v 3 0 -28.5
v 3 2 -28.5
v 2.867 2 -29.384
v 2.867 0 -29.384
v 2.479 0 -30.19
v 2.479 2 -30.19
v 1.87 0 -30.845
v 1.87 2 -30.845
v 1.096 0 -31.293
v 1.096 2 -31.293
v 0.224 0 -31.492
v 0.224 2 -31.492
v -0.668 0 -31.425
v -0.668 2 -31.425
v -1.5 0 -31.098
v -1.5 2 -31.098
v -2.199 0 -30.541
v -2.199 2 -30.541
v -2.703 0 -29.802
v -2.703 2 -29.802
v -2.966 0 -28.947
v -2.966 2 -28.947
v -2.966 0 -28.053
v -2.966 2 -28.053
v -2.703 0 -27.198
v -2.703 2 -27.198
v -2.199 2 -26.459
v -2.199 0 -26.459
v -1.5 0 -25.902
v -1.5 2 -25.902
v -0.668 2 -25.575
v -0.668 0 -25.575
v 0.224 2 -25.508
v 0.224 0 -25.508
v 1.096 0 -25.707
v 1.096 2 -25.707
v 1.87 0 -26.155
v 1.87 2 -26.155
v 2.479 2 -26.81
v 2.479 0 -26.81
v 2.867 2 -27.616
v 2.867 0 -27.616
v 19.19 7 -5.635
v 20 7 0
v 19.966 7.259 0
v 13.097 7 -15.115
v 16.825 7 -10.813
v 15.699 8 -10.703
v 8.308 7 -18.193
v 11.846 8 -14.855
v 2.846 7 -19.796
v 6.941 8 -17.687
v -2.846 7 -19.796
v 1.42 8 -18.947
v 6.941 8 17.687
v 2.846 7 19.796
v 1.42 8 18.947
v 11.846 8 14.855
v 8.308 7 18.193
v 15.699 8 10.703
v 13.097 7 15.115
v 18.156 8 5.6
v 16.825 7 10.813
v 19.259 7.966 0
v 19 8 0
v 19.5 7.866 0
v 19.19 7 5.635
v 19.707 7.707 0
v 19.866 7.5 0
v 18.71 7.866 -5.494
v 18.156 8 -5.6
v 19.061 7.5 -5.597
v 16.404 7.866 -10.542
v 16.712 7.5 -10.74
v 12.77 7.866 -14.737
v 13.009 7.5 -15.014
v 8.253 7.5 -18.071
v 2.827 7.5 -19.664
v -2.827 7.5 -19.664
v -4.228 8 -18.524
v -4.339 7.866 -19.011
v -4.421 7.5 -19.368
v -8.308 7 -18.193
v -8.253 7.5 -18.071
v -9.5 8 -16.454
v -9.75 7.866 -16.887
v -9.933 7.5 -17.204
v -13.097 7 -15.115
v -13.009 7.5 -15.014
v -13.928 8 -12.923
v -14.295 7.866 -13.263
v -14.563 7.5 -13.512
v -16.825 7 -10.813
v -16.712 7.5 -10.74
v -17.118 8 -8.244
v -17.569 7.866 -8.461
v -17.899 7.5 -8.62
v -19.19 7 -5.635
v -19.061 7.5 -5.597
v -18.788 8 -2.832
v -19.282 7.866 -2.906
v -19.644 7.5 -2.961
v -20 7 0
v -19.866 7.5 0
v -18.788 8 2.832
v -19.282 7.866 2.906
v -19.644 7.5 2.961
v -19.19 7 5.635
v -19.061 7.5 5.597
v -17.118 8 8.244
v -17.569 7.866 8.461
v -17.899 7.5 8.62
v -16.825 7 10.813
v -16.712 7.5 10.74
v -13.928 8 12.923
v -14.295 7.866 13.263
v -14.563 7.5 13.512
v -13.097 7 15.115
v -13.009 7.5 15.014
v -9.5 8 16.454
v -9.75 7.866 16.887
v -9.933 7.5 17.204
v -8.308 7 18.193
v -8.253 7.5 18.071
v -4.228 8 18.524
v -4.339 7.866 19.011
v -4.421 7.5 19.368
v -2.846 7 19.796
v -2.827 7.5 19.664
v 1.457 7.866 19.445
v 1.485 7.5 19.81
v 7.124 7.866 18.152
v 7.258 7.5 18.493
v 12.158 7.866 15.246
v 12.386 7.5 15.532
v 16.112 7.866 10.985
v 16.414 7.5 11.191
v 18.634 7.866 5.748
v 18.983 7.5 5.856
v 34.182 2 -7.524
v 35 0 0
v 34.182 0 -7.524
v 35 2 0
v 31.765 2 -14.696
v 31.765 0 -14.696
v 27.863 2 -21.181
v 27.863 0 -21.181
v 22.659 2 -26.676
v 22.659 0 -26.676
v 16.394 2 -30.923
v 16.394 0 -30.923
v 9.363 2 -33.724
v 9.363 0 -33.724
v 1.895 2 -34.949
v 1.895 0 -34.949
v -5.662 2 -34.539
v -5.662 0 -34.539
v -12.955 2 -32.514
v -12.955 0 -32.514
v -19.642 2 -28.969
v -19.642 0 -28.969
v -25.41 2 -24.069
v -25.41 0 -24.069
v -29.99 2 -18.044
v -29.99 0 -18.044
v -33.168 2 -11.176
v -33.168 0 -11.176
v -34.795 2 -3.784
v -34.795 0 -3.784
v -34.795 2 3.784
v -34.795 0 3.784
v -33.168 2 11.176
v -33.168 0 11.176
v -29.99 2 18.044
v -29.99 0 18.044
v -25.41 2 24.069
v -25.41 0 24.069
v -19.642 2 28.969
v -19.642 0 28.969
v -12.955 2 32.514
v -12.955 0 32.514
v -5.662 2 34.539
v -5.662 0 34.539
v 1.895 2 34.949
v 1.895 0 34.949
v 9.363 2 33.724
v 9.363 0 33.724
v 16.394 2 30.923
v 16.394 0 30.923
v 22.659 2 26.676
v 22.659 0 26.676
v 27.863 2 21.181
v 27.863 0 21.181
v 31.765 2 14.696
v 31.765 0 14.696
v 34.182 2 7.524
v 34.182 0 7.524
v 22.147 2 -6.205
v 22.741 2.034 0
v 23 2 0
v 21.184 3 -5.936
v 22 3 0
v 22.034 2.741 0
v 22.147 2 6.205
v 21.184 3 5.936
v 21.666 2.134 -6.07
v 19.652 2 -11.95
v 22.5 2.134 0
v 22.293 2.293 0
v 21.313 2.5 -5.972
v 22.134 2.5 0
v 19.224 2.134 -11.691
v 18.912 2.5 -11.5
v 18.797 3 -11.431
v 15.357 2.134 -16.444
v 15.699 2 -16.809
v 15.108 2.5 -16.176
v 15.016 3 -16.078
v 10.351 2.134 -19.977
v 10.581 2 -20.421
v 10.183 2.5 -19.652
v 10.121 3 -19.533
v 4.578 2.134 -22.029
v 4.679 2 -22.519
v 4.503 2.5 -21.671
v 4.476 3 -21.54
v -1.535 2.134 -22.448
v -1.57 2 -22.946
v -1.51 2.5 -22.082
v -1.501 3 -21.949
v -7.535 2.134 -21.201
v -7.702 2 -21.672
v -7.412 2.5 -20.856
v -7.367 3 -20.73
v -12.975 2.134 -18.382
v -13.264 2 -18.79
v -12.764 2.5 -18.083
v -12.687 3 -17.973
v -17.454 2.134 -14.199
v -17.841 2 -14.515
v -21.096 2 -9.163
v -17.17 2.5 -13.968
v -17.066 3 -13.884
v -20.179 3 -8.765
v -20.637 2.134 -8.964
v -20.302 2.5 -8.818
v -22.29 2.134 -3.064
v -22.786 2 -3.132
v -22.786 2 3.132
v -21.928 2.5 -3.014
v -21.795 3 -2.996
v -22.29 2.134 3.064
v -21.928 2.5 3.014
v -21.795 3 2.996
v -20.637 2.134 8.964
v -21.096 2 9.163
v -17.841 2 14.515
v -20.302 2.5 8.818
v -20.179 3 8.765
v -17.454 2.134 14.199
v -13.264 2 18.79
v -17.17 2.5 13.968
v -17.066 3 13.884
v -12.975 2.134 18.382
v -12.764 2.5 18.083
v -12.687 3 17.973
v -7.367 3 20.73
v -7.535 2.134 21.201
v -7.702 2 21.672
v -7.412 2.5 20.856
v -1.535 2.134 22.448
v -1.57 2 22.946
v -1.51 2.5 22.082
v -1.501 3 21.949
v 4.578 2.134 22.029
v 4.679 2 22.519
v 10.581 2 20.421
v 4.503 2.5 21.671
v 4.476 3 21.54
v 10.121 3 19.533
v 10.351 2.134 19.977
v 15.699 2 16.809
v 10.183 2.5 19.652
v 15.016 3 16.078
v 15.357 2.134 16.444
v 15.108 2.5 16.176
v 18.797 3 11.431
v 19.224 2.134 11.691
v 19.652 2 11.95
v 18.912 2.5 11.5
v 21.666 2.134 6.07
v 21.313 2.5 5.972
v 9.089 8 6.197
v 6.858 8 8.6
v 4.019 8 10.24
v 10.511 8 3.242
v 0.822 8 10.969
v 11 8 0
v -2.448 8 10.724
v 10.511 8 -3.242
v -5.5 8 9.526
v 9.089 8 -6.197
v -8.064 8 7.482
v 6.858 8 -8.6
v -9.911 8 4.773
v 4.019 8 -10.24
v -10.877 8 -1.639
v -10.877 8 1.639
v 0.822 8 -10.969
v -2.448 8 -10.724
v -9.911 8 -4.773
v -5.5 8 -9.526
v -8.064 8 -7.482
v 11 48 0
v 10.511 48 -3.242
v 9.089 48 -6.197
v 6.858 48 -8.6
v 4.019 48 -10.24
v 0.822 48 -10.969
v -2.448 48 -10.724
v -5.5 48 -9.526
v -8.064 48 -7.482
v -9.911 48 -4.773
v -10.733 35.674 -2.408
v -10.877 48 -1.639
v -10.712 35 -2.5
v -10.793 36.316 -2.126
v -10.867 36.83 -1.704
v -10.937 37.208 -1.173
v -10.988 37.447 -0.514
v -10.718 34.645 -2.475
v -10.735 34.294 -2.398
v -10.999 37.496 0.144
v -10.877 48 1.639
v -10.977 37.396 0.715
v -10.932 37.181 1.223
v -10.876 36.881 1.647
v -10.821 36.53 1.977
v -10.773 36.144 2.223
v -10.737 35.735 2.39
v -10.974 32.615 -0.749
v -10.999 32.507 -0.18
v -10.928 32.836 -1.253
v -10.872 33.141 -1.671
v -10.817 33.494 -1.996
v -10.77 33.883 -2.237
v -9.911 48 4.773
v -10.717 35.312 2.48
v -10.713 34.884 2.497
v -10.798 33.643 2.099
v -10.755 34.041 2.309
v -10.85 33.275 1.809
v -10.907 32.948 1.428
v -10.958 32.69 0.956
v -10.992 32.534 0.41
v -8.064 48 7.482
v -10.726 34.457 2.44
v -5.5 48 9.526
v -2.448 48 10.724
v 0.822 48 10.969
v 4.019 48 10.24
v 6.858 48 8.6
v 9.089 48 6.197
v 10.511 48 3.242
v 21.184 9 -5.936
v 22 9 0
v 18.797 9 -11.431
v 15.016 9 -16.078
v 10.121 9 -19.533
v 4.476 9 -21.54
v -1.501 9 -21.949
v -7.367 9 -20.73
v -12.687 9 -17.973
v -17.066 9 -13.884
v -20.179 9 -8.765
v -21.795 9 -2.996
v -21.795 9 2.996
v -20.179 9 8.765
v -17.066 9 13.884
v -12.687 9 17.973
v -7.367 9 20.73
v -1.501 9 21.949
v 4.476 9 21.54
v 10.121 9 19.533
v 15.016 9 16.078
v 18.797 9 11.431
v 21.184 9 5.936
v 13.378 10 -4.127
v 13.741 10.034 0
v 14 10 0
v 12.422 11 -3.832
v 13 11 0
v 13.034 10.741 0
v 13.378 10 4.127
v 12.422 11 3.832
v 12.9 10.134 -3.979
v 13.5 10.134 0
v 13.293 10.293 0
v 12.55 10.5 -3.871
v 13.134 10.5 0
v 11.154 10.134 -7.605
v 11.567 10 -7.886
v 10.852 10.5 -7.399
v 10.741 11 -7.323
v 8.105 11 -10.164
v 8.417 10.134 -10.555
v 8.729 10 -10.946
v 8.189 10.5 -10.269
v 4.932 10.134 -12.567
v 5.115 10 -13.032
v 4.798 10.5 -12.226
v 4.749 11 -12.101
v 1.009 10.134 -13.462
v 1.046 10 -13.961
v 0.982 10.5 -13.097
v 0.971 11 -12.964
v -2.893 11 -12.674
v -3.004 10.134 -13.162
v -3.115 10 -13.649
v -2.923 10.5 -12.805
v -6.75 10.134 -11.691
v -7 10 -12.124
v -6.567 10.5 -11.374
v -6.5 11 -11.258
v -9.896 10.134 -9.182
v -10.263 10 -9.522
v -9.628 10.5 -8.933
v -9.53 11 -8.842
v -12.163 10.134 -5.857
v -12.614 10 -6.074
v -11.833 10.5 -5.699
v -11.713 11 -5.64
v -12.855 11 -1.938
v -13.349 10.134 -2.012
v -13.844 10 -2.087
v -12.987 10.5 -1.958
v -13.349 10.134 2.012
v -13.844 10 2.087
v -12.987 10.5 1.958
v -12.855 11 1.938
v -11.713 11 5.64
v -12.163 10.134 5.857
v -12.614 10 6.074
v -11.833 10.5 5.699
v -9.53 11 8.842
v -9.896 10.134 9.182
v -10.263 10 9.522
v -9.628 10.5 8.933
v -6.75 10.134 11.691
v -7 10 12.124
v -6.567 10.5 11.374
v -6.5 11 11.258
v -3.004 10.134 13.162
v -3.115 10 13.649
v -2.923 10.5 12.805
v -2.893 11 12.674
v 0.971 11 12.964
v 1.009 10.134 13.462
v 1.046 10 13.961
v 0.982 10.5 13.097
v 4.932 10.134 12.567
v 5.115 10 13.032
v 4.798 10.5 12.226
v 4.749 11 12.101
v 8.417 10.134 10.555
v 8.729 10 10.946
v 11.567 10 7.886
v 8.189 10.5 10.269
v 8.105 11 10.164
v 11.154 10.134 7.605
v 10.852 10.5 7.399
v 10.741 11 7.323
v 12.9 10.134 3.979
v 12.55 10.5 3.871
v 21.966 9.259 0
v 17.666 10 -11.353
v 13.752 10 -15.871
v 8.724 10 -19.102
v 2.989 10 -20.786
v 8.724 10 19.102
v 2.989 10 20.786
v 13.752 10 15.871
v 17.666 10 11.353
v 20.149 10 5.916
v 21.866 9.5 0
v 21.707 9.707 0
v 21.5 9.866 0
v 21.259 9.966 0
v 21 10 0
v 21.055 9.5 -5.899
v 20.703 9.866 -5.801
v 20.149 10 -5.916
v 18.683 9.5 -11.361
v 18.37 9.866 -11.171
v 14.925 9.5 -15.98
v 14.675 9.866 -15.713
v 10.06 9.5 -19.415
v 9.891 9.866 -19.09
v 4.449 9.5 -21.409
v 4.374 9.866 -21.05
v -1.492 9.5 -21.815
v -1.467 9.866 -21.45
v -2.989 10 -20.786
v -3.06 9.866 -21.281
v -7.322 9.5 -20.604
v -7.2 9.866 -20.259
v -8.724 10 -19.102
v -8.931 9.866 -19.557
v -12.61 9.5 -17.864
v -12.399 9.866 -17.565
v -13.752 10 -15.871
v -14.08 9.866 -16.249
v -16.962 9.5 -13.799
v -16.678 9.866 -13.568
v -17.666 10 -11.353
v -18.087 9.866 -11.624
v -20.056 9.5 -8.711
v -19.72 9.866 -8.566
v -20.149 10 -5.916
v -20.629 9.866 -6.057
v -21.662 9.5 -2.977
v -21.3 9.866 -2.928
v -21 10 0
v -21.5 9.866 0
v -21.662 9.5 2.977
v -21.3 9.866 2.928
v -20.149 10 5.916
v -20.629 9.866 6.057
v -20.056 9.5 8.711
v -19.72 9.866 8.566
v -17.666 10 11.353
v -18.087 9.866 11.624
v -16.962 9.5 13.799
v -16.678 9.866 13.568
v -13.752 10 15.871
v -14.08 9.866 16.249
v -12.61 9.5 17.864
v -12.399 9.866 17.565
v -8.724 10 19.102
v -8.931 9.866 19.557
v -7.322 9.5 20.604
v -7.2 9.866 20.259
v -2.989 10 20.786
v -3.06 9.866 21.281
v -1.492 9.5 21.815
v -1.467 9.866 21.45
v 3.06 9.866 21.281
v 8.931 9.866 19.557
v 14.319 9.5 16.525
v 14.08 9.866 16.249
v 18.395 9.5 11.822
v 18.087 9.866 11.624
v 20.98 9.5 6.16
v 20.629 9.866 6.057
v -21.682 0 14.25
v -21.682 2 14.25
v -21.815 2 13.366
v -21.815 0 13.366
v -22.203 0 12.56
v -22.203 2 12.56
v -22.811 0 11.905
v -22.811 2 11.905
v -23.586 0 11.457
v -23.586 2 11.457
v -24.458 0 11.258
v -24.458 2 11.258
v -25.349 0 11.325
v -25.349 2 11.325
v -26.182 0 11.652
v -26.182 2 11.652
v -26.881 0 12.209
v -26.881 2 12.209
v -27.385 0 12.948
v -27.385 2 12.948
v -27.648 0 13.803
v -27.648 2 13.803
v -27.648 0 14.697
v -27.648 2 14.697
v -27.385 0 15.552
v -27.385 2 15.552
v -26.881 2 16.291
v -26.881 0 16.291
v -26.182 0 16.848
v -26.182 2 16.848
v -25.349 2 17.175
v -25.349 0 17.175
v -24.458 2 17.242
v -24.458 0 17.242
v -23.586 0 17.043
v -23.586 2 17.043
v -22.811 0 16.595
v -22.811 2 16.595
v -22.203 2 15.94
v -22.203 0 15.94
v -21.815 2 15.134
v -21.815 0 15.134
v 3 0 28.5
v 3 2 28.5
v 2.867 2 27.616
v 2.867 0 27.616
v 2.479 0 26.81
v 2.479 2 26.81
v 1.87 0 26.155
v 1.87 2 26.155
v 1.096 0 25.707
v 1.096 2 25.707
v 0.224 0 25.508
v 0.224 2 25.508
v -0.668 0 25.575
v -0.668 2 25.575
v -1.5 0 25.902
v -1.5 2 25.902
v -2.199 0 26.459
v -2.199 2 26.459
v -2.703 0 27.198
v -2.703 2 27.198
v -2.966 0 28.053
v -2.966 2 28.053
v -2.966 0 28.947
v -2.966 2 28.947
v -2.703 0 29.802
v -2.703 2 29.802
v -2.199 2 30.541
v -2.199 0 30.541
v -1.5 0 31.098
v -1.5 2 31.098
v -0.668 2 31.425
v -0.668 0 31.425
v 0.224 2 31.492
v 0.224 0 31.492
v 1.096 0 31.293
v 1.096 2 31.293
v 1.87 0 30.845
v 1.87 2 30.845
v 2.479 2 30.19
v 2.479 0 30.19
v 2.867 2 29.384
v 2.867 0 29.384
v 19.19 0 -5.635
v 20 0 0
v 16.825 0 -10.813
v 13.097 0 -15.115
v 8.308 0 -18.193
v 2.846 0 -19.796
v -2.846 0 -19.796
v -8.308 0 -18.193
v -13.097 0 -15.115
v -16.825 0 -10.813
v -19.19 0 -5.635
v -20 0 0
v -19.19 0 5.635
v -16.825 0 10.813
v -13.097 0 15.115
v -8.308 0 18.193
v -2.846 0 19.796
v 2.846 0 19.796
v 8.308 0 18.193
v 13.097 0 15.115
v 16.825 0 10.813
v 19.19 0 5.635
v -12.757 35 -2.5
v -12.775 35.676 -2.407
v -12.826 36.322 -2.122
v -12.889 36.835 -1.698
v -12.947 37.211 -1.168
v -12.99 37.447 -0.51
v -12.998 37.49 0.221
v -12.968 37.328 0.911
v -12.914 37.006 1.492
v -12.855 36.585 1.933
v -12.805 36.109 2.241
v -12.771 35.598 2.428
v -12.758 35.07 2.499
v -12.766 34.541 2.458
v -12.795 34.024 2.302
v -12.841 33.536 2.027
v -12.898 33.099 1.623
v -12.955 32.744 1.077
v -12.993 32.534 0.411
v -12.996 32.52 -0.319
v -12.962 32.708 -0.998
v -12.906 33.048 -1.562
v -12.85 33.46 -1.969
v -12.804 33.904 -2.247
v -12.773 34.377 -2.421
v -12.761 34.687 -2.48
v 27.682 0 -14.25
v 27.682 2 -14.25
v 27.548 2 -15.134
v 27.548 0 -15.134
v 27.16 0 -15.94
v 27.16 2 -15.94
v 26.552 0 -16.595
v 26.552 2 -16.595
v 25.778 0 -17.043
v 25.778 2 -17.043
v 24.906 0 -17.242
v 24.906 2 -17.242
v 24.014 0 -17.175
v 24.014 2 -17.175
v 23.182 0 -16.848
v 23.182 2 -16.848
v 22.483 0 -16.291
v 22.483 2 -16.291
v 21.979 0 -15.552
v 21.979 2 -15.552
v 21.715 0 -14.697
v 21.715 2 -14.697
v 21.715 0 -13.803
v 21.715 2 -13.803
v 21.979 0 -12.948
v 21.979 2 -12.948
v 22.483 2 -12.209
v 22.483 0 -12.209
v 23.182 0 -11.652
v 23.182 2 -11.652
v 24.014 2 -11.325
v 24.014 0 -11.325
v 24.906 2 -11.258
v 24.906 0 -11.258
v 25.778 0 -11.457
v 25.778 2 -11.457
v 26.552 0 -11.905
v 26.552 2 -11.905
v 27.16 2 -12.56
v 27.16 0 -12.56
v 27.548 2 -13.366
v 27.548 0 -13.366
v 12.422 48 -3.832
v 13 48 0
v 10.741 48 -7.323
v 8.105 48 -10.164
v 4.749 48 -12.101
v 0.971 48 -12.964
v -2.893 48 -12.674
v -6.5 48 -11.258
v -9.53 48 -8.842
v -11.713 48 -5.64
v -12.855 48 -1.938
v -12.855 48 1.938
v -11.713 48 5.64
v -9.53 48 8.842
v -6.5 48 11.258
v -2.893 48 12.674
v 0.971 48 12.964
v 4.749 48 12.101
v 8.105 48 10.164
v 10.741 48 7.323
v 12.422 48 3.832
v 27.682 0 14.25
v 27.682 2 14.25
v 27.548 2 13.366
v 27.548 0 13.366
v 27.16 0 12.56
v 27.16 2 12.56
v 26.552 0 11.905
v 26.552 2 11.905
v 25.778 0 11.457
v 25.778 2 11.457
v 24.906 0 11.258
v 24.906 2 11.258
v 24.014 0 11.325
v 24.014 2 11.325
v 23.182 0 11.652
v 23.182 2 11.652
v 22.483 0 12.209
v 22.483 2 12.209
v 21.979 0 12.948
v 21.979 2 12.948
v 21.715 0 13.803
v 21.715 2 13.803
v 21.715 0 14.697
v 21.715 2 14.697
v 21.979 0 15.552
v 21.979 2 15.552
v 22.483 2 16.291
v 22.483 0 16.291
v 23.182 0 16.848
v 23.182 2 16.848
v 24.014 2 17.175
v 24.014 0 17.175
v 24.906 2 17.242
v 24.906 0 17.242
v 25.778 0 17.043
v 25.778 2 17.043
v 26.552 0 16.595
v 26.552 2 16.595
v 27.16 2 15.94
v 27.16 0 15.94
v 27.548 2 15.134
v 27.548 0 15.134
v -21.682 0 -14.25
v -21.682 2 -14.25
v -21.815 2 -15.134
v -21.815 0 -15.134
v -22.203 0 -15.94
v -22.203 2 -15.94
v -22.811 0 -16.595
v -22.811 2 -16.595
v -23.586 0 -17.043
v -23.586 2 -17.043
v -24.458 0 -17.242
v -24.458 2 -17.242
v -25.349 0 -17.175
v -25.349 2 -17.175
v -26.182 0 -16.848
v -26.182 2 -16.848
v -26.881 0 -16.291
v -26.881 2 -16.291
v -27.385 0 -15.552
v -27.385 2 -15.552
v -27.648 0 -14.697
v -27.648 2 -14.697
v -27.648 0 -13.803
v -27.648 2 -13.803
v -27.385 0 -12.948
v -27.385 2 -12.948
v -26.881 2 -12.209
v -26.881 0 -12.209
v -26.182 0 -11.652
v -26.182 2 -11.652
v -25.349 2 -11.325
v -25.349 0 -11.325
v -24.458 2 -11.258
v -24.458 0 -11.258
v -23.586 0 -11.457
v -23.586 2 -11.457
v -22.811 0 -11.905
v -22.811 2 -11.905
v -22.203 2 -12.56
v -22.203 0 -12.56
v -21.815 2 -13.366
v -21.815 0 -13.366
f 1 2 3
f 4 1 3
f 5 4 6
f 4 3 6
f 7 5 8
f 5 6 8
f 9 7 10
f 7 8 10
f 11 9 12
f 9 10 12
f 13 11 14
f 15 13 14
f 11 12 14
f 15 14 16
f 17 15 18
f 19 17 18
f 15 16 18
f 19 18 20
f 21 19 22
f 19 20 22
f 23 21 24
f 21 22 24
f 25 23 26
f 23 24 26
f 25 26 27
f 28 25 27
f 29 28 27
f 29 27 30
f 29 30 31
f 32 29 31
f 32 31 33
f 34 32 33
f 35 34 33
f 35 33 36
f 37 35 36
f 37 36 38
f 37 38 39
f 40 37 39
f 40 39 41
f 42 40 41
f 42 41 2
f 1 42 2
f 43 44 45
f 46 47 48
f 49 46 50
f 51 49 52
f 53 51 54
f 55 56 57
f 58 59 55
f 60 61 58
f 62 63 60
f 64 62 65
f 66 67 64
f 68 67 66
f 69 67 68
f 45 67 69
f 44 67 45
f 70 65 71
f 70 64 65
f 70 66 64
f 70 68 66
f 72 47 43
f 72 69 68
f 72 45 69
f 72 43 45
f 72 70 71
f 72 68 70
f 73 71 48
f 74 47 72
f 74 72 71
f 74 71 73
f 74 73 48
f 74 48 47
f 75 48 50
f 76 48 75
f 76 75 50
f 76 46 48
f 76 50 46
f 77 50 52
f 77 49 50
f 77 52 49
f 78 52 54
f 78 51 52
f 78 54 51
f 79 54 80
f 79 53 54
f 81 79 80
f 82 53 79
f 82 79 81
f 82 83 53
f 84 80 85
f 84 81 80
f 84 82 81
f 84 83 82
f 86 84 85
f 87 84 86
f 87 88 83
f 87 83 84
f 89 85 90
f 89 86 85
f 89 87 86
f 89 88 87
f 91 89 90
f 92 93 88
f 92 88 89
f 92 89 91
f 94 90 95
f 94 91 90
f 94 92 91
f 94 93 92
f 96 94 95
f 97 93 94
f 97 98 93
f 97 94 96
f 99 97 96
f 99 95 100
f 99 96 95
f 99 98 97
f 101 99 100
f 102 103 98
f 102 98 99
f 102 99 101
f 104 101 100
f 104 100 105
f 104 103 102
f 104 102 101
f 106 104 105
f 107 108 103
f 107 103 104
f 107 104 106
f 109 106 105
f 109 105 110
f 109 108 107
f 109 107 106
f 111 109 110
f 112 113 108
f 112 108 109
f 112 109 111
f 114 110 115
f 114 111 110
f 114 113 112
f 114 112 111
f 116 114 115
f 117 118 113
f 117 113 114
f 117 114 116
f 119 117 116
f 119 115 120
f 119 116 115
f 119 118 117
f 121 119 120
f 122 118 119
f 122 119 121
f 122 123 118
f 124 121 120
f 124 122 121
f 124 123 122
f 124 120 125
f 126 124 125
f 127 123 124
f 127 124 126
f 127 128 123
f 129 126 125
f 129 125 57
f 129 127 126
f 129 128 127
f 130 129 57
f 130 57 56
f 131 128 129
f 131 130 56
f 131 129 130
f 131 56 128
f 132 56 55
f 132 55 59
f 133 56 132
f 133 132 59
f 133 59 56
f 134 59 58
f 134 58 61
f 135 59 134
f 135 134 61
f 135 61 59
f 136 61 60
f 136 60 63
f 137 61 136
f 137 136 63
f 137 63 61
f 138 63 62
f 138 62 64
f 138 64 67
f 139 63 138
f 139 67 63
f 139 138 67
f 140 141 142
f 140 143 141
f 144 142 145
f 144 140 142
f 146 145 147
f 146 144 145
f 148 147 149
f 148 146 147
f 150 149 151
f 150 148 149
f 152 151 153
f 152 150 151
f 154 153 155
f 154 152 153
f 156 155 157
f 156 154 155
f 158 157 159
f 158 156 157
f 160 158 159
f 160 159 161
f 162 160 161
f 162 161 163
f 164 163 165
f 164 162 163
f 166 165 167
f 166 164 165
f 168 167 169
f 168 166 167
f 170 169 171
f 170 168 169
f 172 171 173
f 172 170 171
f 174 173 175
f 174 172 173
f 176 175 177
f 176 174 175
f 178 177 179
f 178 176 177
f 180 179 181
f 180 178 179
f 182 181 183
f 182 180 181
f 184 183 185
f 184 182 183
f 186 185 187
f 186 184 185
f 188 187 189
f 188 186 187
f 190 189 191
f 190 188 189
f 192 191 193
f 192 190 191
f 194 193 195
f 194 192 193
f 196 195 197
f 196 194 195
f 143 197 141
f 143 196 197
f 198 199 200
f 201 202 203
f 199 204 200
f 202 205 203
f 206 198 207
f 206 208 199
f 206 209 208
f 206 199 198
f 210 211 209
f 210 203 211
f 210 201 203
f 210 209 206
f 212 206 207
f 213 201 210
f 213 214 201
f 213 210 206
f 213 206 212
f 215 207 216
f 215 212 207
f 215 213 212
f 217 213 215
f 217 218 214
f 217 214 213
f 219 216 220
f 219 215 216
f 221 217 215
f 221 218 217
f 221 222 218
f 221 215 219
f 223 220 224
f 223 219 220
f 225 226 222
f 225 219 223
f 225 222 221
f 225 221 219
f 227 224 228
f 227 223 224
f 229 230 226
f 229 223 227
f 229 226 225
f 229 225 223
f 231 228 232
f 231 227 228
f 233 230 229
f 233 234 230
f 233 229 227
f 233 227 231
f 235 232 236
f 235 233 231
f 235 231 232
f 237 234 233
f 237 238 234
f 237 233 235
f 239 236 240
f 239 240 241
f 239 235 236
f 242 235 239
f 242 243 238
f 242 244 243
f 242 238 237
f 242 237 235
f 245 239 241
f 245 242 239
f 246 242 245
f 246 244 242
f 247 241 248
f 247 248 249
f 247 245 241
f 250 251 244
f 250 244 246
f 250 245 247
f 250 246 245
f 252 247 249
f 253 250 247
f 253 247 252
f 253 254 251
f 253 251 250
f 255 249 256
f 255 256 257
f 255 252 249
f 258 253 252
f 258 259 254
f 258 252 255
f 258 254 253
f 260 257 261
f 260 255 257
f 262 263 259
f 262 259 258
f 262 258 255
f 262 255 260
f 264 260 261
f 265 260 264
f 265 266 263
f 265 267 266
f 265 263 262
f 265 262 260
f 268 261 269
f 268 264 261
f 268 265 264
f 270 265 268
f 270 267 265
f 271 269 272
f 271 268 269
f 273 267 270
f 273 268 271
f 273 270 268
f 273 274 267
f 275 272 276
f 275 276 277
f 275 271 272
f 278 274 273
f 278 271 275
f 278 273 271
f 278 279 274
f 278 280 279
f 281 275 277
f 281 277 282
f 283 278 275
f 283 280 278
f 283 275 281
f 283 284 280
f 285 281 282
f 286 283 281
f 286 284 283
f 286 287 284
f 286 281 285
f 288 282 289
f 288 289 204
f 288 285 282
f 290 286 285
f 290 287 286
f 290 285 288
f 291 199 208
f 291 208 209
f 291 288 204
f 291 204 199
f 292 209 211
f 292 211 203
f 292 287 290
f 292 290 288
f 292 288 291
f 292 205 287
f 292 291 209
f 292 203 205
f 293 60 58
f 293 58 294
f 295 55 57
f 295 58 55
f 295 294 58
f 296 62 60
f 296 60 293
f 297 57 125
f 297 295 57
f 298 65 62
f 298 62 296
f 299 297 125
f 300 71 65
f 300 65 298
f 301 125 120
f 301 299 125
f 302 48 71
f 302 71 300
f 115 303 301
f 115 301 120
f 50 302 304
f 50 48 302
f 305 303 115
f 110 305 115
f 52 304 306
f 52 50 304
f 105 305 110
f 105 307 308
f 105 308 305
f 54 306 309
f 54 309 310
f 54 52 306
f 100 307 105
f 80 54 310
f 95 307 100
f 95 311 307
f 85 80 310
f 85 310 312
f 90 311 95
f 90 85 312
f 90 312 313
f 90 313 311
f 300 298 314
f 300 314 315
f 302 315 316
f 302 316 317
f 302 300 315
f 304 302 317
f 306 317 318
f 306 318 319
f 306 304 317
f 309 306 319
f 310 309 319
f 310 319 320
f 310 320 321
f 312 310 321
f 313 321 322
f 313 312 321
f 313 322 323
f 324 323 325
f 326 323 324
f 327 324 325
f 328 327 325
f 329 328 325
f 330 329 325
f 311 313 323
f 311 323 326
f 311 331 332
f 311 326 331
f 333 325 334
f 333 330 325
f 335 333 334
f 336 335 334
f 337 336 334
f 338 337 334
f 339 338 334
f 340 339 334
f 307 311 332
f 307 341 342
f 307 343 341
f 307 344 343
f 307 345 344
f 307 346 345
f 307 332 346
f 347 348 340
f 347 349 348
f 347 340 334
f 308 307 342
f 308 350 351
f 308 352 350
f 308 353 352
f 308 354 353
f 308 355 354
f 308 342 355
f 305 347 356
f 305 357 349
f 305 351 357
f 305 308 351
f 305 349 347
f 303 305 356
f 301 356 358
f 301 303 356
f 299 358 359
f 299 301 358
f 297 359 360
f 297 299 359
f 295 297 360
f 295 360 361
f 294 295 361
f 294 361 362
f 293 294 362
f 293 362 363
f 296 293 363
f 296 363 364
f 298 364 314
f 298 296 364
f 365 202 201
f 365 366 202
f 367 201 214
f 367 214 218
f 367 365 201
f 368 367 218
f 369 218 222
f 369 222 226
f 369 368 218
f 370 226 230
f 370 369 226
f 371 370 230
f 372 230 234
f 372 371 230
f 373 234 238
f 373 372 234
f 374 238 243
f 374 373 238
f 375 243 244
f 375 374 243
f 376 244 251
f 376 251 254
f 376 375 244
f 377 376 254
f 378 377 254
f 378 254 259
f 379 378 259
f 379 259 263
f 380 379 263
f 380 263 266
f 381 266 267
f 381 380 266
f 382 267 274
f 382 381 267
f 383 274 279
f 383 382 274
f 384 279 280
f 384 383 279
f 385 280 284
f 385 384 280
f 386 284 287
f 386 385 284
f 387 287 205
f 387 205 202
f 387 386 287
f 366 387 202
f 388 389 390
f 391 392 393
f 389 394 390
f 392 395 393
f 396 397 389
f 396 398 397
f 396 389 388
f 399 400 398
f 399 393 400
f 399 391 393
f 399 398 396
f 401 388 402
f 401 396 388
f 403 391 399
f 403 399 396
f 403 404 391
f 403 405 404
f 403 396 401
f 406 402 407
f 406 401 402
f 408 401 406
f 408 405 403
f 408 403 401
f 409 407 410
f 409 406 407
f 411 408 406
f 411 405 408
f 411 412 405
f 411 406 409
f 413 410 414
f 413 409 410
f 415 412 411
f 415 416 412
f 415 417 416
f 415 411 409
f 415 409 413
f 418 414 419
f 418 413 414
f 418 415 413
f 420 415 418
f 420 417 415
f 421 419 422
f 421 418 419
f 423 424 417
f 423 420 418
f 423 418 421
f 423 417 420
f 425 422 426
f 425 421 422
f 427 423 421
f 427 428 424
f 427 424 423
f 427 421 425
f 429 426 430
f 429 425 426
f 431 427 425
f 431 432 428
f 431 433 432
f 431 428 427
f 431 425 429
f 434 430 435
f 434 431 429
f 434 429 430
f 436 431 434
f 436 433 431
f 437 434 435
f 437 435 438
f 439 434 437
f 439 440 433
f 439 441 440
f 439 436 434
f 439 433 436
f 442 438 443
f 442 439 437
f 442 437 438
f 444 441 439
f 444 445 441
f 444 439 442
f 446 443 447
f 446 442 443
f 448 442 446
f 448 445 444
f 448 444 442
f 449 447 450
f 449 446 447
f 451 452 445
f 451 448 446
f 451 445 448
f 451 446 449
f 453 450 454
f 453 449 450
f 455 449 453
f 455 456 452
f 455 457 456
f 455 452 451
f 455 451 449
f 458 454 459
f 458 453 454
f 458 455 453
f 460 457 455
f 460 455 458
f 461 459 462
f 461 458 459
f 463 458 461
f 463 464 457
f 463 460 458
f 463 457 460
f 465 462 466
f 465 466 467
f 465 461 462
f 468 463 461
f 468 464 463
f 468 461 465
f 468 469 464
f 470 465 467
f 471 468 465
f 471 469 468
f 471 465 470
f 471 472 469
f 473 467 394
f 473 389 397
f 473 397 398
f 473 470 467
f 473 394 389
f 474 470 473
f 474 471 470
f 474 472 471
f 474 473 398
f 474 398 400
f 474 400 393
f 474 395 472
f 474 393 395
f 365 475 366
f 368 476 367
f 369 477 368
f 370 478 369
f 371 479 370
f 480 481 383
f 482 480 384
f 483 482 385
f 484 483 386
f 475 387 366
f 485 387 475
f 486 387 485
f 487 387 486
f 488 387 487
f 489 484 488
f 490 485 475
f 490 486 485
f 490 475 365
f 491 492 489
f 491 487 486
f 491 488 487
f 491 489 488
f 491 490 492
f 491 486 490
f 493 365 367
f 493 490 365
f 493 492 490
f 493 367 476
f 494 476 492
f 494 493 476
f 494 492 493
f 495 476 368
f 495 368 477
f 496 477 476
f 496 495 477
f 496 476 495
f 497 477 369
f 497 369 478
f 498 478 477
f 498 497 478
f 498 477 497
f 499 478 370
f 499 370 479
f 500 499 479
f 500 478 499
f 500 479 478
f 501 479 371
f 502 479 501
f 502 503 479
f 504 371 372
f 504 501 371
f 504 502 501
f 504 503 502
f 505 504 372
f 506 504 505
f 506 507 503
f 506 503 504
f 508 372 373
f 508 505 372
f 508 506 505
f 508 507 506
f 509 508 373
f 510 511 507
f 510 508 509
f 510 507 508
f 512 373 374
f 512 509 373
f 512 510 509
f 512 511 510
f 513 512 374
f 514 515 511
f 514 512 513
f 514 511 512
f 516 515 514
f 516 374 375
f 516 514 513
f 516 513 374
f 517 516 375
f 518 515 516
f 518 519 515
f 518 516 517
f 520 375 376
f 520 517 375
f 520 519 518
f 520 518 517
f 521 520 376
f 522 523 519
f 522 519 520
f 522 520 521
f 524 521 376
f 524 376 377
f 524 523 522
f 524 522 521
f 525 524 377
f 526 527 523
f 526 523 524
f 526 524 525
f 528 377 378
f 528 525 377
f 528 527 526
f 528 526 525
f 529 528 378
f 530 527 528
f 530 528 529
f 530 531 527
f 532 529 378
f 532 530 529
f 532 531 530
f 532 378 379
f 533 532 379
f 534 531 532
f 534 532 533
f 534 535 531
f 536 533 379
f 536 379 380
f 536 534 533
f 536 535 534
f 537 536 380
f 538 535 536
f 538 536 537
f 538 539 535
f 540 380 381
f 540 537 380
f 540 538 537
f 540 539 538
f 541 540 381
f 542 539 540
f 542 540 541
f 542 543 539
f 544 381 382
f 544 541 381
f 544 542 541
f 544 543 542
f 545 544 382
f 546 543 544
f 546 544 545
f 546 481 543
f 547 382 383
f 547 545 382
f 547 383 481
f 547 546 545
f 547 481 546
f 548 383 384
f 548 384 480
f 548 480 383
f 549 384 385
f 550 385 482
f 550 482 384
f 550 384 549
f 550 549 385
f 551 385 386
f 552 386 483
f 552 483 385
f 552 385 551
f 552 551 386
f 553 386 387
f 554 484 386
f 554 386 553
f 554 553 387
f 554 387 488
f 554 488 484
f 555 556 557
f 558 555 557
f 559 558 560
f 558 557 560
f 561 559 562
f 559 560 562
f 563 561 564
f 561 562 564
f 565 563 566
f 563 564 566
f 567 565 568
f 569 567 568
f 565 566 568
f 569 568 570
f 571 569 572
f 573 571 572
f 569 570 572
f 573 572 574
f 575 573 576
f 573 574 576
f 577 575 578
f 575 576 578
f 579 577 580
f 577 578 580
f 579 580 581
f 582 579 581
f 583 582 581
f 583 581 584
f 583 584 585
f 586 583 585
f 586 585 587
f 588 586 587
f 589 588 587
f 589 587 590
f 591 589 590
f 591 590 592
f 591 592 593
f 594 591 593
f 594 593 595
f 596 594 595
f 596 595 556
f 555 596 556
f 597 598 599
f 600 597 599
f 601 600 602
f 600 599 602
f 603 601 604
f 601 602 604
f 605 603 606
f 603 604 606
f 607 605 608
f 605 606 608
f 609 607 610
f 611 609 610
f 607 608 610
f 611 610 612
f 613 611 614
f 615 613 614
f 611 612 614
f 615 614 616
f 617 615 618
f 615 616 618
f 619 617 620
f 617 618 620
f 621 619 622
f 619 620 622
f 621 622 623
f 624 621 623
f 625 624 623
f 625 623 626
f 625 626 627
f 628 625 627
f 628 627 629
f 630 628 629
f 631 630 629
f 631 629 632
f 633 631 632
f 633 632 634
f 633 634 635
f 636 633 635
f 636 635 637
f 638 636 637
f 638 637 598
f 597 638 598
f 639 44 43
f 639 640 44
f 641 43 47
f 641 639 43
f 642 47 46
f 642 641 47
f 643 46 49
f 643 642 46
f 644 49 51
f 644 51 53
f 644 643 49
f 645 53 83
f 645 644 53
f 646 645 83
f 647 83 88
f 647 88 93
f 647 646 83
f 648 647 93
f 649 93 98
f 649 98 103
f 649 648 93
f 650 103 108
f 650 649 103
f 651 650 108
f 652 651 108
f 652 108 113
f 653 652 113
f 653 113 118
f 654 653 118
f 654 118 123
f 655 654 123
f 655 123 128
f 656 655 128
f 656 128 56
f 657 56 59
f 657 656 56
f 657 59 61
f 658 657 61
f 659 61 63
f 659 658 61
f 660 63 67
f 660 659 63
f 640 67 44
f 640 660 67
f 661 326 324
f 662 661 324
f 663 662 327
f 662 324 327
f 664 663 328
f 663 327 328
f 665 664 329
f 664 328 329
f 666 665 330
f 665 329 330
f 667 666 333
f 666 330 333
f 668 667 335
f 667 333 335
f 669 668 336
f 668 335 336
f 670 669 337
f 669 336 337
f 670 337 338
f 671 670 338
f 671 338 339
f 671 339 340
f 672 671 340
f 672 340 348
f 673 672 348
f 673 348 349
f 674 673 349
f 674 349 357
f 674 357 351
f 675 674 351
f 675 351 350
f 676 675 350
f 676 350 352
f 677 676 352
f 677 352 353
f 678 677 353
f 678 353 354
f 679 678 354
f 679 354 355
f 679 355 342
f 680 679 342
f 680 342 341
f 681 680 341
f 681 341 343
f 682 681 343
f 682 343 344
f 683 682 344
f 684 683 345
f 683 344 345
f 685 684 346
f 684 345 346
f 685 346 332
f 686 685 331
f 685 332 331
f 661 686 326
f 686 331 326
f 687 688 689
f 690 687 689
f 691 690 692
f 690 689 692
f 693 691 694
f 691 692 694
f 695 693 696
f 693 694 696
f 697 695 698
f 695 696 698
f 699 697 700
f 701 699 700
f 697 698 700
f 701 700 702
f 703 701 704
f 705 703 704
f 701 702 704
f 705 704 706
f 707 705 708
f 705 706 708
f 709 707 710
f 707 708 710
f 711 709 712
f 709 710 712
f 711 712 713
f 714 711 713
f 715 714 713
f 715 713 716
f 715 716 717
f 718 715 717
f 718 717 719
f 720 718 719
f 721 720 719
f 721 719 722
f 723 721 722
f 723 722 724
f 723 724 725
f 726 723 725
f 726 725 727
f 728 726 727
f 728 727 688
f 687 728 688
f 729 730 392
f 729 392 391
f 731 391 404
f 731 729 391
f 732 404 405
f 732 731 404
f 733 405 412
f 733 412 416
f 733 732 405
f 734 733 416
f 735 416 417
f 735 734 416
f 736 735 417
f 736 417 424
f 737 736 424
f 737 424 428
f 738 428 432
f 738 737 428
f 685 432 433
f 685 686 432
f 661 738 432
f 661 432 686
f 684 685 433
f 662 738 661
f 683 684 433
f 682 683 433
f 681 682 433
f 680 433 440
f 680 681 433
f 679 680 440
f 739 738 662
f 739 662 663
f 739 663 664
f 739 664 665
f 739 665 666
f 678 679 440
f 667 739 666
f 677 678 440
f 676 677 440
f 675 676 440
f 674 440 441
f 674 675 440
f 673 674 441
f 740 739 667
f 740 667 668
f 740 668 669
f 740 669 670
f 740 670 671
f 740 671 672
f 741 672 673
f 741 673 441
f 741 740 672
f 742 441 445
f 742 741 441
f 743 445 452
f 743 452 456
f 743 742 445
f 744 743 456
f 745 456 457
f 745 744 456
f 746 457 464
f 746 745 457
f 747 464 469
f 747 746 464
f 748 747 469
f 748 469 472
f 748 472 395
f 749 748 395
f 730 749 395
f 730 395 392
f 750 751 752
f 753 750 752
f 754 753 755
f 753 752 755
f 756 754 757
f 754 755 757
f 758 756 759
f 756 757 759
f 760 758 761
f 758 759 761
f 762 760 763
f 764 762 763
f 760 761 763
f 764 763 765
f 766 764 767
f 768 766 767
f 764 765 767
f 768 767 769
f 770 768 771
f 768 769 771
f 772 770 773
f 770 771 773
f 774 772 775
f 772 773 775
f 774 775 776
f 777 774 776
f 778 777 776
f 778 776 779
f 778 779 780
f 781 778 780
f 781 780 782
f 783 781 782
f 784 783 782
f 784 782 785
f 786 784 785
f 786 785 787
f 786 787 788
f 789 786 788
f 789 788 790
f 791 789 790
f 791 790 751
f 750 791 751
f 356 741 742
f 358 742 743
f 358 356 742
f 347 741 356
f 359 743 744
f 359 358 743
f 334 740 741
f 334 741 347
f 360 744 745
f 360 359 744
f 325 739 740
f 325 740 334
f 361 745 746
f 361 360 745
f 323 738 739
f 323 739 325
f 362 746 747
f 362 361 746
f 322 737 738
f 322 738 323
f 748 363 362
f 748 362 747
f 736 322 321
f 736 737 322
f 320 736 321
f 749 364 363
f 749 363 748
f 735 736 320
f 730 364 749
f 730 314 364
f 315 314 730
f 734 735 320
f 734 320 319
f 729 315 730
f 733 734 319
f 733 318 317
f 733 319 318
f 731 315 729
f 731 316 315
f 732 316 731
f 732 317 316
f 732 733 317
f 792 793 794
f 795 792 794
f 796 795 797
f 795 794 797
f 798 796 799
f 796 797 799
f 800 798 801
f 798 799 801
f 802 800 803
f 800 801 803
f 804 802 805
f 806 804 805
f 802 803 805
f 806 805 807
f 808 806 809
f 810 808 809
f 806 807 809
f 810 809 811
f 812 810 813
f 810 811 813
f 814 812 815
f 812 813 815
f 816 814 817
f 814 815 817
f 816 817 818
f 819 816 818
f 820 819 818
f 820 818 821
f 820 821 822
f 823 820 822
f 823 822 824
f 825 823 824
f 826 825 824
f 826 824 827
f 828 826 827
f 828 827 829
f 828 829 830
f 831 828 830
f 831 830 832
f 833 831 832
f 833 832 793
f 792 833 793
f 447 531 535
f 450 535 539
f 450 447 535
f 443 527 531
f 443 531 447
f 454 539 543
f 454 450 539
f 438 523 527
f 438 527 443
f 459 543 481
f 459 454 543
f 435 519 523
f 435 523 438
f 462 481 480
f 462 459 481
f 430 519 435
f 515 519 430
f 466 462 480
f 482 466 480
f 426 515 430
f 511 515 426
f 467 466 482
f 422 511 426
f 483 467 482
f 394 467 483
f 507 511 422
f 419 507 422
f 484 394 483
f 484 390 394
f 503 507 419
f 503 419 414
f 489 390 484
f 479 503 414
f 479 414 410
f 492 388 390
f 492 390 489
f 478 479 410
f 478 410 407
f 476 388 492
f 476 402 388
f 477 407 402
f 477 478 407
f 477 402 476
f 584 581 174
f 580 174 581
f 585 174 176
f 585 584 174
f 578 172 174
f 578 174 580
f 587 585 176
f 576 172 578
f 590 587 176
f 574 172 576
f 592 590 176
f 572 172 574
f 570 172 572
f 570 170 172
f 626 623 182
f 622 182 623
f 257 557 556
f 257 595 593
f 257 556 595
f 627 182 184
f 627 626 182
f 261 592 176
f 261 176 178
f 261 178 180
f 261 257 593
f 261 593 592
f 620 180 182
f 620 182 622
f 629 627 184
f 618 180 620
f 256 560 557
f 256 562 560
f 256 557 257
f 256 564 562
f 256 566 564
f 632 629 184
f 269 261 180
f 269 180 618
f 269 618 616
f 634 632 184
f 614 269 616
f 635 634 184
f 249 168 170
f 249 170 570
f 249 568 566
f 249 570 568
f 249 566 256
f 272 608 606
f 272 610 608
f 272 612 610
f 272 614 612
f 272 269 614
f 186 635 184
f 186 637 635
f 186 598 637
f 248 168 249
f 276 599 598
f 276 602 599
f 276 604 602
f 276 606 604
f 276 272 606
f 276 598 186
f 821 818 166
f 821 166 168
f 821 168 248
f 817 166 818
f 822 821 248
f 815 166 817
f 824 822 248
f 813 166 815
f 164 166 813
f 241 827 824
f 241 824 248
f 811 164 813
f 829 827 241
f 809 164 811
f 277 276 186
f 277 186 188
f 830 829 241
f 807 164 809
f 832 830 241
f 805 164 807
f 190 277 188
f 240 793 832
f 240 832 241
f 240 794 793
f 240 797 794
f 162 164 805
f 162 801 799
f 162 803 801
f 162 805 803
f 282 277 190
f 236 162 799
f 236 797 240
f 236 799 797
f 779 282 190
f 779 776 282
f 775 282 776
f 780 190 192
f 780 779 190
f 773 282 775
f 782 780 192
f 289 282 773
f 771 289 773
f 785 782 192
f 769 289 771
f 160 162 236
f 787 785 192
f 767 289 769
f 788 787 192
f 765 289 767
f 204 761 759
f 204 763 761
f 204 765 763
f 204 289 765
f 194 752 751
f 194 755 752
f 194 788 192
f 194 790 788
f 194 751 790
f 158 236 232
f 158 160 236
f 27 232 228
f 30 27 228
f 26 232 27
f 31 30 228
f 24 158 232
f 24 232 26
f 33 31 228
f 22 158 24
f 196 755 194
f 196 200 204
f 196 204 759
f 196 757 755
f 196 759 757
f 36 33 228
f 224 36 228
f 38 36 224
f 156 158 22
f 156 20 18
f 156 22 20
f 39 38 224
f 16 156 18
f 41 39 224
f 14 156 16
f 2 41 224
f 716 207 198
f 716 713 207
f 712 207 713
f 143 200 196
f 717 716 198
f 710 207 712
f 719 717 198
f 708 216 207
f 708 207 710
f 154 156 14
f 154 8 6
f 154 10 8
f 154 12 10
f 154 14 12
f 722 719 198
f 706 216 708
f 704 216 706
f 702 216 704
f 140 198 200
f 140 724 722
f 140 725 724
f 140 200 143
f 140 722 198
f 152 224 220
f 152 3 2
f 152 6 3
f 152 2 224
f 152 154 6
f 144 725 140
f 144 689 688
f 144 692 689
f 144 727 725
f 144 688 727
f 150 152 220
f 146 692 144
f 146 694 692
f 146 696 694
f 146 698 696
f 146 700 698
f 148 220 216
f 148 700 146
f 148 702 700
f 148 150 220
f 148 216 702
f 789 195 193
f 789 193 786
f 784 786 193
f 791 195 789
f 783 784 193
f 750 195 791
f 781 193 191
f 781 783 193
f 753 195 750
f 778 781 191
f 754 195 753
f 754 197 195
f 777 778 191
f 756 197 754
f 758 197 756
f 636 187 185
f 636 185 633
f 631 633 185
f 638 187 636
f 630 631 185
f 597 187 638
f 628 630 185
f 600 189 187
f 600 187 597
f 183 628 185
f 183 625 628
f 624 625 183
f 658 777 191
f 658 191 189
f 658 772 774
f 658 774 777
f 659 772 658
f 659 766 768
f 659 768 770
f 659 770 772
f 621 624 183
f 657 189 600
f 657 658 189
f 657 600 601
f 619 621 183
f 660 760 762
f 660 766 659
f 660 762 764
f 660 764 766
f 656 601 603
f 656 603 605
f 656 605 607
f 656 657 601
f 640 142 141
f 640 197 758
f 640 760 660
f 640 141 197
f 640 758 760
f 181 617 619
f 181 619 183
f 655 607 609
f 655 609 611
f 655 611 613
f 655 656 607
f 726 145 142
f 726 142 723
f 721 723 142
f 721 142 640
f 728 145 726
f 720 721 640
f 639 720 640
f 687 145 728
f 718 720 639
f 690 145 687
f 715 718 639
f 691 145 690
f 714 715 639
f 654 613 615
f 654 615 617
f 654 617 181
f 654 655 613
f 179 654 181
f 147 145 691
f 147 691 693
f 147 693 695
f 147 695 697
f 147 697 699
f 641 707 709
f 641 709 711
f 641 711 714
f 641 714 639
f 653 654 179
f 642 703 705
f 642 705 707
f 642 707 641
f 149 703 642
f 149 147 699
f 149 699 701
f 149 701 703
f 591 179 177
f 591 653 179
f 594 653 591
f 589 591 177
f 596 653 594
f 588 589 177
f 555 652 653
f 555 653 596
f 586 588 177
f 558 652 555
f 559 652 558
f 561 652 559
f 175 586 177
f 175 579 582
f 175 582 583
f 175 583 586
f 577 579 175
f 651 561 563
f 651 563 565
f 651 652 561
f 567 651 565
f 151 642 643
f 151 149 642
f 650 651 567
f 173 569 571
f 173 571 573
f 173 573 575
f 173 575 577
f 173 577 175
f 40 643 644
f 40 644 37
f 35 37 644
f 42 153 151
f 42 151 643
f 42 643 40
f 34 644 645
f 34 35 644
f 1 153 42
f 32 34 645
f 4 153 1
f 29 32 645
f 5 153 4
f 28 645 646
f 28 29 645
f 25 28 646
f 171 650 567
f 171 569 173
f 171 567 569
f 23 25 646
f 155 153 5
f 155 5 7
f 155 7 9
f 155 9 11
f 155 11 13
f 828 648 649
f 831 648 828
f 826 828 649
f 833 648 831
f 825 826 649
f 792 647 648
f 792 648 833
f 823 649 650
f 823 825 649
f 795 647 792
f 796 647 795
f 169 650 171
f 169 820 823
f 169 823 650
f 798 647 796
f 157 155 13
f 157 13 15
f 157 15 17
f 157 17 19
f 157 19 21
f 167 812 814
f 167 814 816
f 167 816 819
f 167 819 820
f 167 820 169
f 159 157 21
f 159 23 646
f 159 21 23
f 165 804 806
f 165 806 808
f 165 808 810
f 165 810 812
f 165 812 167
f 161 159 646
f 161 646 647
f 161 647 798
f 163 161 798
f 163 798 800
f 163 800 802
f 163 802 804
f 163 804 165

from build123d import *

# Parameters (mm, degrees)
SKETCH_2_R          = 3
CUT_EXTRUDE_1_DEPTH = 3
SKETCH_3_R          = 2.5
CUT_EXTRUDE_2_DEPTH = 36


with BuildPart() as part:
    # 草图1 → 旋转1 (revolve)
    with BuildSketch(Plane.XY):
        with BuildLine():
            Line((20, 0), (35, 0))
            Line((35, 0), (35, 2))
            Line((35, 2), (23, 2))
            ThreePointArc((23, 2), (22.292893219, 2.292893219), (22, 3))
            Line((22, 3), (22, 9))
            ThreePointArc((22, 9), (21.707106781, 9.707106781), (21, 10))
            Line((21, 10), (14, 10))
            ThreePointArc((14, 10), (13.292893219, 10.292893219), (13, 11))
            Line((13, 11), (13, 48))
            Line((13, 48), (11, 48))
            Line((11, 48), (11, 8))
            Line((11, 8), (19, 8))
            ThreePointArc((19, 8), (19.707106781, 7.707106781), (20, 7))
            Line((20, 7), (20, 0))
        make_face()
    revolve(axis=Axis((0, 0, 0), (0, 1, 0)))

    # 草图2 → 切除-拉伸1 (cut, through all)
    with BuildSketch(Plane(origin=(0, 2, 0), x_dir=(1, 0, 0), z_dir=(0, 1, 0))):
        with Locations((0, 28.5)):
            Circle(SKETCH_2_R)
        with Locations((24.681724008, 14.25)):
            Circle(SKETCH_2_R)
        with Locations((24.681724008, -14.25)):
            Circle(SKETCH_2_R)
        with Locations((0, -28.5)):
            Circle(SKETCH_2_R)
        with Locations((-24.681724008, -14.25)):
            Circle(SKETCH_2_R)
        with Locations((-24.681724008, 14.25)):
            Circle(SKETCH_2_R)
    extrude(amount=-CUT_EXTRUDE_1_DEPTH, mode=Mode.SUBTRACT)

    # 草图3 → 切除-拉伸2 (cut, through all)
    with BuildSketch(Plane(origin=(0, 0, 0), x_dir=(0, 0, -1), z_dir=(1, 0, 0))):
        with Locations((0, 35)):
            Circle(SKETCH_3_R)
    extrude(amount=-CUT_EXTRUDE_2_DEPTH, mode=Mode.SUBTRACT)


solid = part.part
